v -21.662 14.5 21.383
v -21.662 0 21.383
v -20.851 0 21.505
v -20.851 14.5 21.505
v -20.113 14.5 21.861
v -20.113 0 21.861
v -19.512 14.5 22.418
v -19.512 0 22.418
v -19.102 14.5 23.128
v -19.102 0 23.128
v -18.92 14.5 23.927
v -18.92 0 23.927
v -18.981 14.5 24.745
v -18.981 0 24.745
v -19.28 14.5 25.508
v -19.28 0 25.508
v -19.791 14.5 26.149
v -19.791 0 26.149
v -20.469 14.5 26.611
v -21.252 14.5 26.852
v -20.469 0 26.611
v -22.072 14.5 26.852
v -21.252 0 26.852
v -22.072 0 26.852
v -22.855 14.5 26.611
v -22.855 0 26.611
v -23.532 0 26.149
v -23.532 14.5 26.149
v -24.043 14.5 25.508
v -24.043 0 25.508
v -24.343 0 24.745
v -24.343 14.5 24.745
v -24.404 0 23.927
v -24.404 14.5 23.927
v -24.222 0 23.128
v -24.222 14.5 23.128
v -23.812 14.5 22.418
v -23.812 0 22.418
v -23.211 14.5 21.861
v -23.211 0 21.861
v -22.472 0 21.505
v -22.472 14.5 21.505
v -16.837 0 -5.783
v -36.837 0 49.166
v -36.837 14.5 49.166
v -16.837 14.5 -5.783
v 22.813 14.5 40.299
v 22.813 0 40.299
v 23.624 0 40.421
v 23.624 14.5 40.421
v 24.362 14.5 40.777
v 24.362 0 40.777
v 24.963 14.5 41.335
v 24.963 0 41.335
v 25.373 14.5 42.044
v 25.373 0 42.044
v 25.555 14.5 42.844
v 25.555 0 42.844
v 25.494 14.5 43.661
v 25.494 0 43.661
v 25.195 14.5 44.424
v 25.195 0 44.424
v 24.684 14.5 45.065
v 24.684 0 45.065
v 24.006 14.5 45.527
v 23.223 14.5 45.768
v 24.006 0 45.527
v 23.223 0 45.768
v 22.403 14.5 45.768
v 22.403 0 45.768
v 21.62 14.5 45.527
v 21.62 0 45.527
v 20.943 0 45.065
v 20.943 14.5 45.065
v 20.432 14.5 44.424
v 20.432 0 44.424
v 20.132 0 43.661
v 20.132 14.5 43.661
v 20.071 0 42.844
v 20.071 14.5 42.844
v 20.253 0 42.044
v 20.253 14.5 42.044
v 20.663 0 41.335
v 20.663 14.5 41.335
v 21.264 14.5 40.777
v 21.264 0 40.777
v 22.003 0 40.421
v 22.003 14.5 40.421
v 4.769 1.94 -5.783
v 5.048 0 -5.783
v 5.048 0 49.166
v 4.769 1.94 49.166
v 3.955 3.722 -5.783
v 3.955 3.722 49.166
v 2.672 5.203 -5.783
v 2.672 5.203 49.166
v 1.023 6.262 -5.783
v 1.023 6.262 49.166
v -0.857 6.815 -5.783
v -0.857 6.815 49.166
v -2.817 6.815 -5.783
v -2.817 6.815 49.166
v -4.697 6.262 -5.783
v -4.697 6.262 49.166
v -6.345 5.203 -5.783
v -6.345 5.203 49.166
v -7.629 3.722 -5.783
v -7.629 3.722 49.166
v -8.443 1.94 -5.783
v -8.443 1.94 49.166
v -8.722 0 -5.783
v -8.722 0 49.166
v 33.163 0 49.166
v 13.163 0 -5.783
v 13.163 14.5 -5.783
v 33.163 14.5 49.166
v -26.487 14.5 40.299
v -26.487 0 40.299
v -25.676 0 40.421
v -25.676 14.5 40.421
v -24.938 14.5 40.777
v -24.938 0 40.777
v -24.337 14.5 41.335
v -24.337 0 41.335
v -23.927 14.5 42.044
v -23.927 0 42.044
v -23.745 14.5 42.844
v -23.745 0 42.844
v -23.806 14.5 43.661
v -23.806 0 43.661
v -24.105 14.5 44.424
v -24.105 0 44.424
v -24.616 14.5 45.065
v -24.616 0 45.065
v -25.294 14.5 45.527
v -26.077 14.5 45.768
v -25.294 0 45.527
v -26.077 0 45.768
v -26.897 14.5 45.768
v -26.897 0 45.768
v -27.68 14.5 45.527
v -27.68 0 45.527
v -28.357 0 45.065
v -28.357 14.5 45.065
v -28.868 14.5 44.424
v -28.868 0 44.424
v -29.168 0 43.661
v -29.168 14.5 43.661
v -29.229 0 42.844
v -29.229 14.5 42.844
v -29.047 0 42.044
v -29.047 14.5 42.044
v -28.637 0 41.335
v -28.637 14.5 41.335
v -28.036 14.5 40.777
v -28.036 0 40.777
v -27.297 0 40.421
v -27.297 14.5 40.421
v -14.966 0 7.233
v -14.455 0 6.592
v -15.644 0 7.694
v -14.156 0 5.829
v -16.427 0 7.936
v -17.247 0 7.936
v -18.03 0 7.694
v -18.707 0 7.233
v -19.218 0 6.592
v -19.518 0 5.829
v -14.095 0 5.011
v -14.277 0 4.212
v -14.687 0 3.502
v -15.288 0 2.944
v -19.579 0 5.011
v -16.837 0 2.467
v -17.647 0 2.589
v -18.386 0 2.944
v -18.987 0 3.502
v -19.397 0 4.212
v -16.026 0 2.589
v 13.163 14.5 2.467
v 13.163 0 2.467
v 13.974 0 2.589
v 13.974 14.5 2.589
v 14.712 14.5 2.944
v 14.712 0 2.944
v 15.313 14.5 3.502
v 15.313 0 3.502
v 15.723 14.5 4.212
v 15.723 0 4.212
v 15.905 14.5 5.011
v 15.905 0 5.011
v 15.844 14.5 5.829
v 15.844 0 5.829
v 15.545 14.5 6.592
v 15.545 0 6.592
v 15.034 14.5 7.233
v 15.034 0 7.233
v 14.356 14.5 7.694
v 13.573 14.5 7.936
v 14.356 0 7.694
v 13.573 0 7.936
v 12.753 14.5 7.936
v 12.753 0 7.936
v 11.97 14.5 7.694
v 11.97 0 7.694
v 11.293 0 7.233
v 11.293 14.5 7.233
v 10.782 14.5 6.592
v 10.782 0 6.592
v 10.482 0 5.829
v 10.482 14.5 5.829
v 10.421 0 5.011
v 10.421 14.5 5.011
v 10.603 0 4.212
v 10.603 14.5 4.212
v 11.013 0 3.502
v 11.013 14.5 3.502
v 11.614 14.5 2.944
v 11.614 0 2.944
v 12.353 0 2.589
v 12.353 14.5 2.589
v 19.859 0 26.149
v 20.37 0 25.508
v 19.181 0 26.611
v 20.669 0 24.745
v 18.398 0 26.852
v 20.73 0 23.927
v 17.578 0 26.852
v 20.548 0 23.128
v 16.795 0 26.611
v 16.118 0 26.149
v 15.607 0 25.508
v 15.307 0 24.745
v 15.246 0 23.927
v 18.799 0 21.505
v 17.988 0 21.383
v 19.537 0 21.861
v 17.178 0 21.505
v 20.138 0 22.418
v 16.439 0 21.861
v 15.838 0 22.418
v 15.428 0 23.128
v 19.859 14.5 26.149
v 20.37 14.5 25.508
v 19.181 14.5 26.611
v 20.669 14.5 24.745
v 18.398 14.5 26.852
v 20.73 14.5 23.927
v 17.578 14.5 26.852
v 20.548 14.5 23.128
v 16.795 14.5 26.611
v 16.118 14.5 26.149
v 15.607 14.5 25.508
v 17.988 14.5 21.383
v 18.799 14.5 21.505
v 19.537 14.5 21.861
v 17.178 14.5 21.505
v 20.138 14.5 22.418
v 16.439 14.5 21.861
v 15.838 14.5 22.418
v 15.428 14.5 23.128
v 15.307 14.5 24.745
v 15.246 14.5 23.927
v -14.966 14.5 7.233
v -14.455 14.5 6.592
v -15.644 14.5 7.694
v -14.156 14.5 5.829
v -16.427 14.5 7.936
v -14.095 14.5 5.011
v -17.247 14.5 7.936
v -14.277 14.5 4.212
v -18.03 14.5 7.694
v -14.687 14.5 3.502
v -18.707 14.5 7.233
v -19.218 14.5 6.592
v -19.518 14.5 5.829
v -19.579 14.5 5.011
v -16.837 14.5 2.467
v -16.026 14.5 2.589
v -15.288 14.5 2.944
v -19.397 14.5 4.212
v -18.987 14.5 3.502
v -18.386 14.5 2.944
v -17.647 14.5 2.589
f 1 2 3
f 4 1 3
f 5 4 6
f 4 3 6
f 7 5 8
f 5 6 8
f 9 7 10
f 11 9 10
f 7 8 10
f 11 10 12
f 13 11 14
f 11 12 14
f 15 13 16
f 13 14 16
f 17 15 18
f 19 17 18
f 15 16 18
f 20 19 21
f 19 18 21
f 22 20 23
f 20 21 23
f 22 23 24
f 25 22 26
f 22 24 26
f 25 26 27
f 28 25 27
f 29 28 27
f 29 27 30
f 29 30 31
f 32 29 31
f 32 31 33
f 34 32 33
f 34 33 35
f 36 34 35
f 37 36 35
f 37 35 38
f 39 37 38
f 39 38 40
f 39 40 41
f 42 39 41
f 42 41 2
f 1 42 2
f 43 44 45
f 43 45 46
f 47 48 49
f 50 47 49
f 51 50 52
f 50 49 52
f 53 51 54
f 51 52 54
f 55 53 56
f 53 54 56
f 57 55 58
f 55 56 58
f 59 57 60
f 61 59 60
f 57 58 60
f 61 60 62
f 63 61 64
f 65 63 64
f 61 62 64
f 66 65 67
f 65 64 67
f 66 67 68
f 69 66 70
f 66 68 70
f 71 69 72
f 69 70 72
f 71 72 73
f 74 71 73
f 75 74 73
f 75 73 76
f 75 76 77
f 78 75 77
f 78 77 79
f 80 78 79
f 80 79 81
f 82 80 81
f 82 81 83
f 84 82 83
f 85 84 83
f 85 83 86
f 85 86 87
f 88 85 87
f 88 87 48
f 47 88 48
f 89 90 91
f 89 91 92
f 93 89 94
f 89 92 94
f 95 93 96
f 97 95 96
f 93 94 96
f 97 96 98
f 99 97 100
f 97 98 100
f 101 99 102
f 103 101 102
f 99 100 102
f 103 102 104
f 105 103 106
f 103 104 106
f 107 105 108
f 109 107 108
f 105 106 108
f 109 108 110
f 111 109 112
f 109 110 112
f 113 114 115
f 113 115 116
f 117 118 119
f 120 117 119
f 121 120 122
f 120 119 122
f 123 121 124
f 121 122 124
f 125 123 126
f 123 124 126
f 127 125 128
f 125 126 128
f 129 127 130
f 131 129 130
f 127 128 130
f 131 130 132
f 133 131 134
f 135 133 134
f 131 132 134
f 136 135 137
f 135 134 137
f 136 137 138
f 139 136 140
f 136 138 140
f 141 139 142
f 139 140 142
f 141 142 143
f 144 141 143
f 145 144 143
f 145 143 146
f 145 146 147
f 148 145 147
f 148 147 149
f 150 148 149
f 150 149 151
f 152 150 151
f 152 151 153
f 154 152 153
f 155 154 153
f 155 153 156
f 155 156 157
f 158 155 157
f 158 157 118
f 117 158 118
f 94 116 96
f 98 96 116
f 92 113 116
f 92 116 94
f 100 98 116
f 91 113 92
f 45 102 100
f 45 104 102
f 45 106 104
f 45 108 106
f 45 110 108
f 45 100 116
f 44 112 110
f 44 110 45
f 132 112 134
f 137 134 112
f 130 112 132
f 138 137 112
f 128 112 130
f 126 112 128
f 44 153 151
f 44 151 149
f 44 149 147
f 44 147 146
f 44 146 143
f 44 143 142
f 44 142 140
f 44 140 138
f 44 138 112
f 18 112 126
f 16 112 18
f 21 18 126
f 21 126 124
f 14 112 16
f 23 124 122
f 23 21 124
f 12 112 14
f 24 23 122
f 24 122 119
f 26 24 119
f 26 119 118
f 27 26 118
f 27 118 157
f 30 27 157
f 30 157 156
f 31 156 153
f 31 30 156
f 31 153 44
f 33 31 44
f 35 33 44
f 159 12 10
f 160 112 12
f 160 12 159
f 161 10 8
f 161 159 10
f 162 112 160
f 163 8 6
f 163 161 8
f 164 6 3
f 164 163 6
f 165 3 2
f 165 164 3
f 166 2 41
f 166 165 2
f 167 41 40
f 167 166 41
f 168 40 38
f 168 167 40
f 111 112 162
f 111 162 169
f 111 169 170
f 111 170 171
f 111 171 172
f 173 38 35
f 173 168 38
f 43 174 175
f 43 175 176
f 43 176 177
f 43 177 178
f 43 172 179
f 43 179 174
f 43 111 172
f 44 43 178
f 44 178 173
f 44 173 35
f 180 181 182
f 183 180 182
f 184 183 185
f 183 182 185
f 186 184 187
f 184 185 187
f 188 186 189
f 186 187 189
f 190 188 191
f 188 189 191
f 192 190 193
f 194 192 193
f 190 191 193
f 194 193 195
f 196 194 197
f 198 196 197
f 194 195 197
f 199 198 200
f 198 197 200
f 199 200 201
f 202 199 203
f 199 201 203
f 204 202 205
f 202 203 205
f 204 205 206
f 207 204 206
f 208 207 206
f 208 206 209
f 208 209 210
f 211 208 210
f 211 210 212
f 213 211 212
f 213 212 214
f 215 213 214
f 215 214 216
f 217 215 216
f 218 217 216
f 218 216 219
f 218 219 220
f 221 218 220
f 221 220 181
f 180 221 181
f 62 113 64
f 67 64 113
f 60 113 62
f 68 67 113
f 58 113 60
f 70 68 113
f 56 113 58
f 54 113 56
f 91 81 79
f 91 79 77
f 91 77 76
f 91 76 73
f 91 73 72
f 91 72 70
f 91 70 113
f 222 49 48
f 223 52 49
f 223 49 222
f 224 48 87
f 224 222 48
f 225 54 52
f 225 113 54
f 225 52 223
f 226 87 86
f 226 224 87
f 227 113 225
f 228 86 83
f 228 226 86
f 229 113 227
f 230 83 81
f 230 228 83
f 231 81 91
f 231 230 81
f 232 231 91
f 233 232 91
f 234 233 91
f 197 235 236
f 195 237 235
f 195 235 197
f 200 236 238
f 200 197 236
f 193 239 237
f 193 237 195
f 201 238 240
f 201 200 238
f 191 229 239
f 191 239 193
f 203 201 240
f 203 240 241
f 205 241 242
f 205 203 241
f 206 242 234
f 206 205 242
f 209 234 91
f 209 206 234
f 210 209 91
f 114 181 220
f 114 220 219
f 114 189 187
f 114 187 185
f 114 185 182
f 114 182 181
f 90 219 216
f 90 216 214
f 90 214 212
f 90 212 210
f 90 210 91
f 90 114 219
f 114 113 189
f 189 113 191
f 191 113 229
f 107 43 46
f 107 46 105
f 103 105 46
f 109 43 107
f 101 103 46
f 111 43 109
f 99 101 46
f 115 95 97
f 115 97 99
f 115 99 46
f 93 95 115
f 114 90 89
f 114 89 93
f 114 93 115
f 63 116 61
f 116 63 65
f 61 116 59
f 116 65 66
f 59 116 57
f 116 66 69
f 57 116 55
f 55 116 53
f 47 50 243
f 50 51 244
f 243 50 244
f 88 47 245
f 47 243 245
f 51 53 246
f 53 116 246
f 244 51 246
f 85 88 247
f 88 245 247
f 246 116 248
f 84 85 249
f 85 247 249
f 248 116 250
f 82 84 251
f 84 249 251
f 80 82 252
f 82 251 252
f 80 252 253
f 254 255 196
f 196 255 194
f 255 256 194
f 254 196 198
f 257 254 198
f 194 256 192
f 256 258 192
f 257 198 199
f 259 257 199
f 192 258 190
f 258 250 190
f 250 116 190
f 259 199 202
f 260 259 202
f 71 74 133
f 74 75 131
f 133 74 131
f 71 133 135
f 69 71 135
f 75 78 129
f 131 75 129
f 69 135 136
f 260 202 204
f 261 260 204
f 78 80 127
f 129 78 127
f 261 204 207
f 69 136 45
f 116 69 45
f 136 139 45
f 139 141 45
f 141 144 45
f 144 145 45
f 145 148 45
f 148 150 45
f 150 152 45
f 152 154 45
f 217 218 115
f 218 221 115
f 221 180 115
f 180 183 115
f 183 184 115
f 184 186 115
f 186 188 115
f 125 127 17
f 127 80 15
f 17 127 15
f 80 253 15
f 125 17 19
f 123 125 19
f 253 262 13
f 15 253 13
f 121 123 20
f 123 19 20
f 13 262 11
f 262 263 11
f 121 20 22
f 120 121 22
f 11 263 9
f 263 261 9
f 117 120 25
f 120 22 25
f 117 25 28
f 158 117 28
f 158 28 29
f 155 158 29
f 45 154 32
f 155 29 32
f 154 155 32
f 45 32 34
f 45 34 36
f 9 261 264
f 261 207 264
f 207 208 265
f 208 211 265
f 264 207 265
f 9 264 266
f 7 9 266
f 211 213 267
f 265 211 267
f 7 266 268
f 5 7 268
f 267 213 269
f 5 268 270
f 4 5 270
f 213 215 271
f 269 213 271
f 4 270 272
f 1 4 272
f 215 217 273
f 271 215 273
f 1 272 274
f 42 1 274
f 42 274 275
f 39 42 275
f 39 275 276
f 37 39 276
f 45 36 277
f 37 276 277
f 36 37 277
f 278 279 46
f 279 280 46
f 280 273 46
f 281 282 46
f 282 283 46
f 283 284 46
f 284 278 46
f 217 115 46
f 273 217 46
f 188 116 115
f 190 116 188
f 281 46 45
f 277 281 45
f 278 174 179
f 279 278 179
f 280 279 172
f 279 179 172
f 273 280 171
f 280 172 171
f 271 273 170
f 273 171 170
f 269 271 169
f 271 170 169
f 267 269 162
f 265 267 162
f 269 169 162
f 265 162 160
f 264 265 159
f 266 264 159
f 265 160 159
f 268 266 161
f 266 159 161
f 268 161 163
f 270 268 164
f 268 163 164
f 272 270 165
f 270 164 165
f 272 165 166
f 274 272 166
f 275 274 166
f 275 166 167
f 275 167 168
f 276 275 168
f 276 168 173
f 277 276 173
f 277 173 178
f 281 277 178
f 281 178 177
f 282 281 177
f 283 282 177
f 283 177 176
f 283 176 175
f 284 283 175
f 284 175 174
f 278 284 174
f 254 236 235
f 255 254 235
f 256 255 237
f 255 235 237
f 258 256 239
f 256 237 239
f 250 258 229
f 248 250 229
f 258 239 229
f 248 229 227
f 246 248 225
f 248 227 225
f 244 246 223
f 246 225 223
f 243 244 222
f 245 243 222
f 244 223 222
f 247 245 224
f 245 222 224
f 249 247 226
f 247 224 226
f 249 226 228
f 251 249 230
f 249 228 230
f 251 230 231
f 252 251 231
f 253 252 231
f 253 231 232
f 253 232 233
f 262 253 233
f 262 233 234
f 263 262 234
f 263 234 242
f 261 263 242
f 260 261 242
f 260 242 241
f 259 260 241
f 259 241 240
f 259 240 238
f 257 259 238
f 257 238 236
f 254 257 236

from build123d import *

# Parameters (mm, degrees)
BOSS_EXTRUDE3_DEPTH                        = 14.5
SKETCH8_R                                  = 6.884606738
CUT_EXTRUDE3_DEPTH                         = 88
F_39_0_21653543_DIAMETER_HOLE1_D           = 5.499999922
F_39_0_21653543_DIAMETER_HOLE1_ON_FACE_2_D = 5.499999922


with BuildPart() as part:
    # Sketch6 → Boss-Extrude3 (new body)
    with BuildSketch(Plane(origin=(0, 0, 0), x_dir=(1, 0, 0), z_dir=(0, 1, 0))):
        Polygon((-16.836914056, 5.783353512), (13.163085944, 5.783353512), (33.163085944, -49.166194877), (-36.836914056, -49.166194877), align=None)
    extrude(amount=BOSS_EXTRUDE3_DEPTH)

    # Sketch8 → Cut-Extrude3 (cut)
    with BuildSketch(Plane.XY.offset(49.166194877)):
        with Locations((-1.836914056, 0)):
            Circle(SKETCH8_R)
    extrude(amount=-CUT_EXTRUDE3_DEPTH, mode=Mode.SUBTRACT)

    # #39 (0.21653543) Diameter Hole1 (through all)
    with Locations(Plane(origin=(17.988085944, 14.5, 24.13287332), x_dir=(0, 0, 1), z_dir=(0, 1, 0))):
        with Locations((0, 0), (18.916226832, 4.825), (18.916226832, -44.475), (-18.916226832, -34.825), (-18.916226832, -4.825), (0, -39.65)):
            Hole(F_39_0_21653543_DIAMETER_HOLE1_D / 2)

    # #39 (0.21653543) Diameter Hole1 on face 2 (through all)
    with Locations(Plane(origin=(-16.836914056, 0, 5.216646488), x_dir=(0, 0, -1), z_dir=(0, -1, 0))):
        with Locations((0, 0), (0, 30), (-37.832453664, 39.65), (-37.832453664, -9.65)):
            Hole(F_39_0_21653543_DIAMETER_HOLE1_ON_FACE_2_D / 2)


solid = part.part
